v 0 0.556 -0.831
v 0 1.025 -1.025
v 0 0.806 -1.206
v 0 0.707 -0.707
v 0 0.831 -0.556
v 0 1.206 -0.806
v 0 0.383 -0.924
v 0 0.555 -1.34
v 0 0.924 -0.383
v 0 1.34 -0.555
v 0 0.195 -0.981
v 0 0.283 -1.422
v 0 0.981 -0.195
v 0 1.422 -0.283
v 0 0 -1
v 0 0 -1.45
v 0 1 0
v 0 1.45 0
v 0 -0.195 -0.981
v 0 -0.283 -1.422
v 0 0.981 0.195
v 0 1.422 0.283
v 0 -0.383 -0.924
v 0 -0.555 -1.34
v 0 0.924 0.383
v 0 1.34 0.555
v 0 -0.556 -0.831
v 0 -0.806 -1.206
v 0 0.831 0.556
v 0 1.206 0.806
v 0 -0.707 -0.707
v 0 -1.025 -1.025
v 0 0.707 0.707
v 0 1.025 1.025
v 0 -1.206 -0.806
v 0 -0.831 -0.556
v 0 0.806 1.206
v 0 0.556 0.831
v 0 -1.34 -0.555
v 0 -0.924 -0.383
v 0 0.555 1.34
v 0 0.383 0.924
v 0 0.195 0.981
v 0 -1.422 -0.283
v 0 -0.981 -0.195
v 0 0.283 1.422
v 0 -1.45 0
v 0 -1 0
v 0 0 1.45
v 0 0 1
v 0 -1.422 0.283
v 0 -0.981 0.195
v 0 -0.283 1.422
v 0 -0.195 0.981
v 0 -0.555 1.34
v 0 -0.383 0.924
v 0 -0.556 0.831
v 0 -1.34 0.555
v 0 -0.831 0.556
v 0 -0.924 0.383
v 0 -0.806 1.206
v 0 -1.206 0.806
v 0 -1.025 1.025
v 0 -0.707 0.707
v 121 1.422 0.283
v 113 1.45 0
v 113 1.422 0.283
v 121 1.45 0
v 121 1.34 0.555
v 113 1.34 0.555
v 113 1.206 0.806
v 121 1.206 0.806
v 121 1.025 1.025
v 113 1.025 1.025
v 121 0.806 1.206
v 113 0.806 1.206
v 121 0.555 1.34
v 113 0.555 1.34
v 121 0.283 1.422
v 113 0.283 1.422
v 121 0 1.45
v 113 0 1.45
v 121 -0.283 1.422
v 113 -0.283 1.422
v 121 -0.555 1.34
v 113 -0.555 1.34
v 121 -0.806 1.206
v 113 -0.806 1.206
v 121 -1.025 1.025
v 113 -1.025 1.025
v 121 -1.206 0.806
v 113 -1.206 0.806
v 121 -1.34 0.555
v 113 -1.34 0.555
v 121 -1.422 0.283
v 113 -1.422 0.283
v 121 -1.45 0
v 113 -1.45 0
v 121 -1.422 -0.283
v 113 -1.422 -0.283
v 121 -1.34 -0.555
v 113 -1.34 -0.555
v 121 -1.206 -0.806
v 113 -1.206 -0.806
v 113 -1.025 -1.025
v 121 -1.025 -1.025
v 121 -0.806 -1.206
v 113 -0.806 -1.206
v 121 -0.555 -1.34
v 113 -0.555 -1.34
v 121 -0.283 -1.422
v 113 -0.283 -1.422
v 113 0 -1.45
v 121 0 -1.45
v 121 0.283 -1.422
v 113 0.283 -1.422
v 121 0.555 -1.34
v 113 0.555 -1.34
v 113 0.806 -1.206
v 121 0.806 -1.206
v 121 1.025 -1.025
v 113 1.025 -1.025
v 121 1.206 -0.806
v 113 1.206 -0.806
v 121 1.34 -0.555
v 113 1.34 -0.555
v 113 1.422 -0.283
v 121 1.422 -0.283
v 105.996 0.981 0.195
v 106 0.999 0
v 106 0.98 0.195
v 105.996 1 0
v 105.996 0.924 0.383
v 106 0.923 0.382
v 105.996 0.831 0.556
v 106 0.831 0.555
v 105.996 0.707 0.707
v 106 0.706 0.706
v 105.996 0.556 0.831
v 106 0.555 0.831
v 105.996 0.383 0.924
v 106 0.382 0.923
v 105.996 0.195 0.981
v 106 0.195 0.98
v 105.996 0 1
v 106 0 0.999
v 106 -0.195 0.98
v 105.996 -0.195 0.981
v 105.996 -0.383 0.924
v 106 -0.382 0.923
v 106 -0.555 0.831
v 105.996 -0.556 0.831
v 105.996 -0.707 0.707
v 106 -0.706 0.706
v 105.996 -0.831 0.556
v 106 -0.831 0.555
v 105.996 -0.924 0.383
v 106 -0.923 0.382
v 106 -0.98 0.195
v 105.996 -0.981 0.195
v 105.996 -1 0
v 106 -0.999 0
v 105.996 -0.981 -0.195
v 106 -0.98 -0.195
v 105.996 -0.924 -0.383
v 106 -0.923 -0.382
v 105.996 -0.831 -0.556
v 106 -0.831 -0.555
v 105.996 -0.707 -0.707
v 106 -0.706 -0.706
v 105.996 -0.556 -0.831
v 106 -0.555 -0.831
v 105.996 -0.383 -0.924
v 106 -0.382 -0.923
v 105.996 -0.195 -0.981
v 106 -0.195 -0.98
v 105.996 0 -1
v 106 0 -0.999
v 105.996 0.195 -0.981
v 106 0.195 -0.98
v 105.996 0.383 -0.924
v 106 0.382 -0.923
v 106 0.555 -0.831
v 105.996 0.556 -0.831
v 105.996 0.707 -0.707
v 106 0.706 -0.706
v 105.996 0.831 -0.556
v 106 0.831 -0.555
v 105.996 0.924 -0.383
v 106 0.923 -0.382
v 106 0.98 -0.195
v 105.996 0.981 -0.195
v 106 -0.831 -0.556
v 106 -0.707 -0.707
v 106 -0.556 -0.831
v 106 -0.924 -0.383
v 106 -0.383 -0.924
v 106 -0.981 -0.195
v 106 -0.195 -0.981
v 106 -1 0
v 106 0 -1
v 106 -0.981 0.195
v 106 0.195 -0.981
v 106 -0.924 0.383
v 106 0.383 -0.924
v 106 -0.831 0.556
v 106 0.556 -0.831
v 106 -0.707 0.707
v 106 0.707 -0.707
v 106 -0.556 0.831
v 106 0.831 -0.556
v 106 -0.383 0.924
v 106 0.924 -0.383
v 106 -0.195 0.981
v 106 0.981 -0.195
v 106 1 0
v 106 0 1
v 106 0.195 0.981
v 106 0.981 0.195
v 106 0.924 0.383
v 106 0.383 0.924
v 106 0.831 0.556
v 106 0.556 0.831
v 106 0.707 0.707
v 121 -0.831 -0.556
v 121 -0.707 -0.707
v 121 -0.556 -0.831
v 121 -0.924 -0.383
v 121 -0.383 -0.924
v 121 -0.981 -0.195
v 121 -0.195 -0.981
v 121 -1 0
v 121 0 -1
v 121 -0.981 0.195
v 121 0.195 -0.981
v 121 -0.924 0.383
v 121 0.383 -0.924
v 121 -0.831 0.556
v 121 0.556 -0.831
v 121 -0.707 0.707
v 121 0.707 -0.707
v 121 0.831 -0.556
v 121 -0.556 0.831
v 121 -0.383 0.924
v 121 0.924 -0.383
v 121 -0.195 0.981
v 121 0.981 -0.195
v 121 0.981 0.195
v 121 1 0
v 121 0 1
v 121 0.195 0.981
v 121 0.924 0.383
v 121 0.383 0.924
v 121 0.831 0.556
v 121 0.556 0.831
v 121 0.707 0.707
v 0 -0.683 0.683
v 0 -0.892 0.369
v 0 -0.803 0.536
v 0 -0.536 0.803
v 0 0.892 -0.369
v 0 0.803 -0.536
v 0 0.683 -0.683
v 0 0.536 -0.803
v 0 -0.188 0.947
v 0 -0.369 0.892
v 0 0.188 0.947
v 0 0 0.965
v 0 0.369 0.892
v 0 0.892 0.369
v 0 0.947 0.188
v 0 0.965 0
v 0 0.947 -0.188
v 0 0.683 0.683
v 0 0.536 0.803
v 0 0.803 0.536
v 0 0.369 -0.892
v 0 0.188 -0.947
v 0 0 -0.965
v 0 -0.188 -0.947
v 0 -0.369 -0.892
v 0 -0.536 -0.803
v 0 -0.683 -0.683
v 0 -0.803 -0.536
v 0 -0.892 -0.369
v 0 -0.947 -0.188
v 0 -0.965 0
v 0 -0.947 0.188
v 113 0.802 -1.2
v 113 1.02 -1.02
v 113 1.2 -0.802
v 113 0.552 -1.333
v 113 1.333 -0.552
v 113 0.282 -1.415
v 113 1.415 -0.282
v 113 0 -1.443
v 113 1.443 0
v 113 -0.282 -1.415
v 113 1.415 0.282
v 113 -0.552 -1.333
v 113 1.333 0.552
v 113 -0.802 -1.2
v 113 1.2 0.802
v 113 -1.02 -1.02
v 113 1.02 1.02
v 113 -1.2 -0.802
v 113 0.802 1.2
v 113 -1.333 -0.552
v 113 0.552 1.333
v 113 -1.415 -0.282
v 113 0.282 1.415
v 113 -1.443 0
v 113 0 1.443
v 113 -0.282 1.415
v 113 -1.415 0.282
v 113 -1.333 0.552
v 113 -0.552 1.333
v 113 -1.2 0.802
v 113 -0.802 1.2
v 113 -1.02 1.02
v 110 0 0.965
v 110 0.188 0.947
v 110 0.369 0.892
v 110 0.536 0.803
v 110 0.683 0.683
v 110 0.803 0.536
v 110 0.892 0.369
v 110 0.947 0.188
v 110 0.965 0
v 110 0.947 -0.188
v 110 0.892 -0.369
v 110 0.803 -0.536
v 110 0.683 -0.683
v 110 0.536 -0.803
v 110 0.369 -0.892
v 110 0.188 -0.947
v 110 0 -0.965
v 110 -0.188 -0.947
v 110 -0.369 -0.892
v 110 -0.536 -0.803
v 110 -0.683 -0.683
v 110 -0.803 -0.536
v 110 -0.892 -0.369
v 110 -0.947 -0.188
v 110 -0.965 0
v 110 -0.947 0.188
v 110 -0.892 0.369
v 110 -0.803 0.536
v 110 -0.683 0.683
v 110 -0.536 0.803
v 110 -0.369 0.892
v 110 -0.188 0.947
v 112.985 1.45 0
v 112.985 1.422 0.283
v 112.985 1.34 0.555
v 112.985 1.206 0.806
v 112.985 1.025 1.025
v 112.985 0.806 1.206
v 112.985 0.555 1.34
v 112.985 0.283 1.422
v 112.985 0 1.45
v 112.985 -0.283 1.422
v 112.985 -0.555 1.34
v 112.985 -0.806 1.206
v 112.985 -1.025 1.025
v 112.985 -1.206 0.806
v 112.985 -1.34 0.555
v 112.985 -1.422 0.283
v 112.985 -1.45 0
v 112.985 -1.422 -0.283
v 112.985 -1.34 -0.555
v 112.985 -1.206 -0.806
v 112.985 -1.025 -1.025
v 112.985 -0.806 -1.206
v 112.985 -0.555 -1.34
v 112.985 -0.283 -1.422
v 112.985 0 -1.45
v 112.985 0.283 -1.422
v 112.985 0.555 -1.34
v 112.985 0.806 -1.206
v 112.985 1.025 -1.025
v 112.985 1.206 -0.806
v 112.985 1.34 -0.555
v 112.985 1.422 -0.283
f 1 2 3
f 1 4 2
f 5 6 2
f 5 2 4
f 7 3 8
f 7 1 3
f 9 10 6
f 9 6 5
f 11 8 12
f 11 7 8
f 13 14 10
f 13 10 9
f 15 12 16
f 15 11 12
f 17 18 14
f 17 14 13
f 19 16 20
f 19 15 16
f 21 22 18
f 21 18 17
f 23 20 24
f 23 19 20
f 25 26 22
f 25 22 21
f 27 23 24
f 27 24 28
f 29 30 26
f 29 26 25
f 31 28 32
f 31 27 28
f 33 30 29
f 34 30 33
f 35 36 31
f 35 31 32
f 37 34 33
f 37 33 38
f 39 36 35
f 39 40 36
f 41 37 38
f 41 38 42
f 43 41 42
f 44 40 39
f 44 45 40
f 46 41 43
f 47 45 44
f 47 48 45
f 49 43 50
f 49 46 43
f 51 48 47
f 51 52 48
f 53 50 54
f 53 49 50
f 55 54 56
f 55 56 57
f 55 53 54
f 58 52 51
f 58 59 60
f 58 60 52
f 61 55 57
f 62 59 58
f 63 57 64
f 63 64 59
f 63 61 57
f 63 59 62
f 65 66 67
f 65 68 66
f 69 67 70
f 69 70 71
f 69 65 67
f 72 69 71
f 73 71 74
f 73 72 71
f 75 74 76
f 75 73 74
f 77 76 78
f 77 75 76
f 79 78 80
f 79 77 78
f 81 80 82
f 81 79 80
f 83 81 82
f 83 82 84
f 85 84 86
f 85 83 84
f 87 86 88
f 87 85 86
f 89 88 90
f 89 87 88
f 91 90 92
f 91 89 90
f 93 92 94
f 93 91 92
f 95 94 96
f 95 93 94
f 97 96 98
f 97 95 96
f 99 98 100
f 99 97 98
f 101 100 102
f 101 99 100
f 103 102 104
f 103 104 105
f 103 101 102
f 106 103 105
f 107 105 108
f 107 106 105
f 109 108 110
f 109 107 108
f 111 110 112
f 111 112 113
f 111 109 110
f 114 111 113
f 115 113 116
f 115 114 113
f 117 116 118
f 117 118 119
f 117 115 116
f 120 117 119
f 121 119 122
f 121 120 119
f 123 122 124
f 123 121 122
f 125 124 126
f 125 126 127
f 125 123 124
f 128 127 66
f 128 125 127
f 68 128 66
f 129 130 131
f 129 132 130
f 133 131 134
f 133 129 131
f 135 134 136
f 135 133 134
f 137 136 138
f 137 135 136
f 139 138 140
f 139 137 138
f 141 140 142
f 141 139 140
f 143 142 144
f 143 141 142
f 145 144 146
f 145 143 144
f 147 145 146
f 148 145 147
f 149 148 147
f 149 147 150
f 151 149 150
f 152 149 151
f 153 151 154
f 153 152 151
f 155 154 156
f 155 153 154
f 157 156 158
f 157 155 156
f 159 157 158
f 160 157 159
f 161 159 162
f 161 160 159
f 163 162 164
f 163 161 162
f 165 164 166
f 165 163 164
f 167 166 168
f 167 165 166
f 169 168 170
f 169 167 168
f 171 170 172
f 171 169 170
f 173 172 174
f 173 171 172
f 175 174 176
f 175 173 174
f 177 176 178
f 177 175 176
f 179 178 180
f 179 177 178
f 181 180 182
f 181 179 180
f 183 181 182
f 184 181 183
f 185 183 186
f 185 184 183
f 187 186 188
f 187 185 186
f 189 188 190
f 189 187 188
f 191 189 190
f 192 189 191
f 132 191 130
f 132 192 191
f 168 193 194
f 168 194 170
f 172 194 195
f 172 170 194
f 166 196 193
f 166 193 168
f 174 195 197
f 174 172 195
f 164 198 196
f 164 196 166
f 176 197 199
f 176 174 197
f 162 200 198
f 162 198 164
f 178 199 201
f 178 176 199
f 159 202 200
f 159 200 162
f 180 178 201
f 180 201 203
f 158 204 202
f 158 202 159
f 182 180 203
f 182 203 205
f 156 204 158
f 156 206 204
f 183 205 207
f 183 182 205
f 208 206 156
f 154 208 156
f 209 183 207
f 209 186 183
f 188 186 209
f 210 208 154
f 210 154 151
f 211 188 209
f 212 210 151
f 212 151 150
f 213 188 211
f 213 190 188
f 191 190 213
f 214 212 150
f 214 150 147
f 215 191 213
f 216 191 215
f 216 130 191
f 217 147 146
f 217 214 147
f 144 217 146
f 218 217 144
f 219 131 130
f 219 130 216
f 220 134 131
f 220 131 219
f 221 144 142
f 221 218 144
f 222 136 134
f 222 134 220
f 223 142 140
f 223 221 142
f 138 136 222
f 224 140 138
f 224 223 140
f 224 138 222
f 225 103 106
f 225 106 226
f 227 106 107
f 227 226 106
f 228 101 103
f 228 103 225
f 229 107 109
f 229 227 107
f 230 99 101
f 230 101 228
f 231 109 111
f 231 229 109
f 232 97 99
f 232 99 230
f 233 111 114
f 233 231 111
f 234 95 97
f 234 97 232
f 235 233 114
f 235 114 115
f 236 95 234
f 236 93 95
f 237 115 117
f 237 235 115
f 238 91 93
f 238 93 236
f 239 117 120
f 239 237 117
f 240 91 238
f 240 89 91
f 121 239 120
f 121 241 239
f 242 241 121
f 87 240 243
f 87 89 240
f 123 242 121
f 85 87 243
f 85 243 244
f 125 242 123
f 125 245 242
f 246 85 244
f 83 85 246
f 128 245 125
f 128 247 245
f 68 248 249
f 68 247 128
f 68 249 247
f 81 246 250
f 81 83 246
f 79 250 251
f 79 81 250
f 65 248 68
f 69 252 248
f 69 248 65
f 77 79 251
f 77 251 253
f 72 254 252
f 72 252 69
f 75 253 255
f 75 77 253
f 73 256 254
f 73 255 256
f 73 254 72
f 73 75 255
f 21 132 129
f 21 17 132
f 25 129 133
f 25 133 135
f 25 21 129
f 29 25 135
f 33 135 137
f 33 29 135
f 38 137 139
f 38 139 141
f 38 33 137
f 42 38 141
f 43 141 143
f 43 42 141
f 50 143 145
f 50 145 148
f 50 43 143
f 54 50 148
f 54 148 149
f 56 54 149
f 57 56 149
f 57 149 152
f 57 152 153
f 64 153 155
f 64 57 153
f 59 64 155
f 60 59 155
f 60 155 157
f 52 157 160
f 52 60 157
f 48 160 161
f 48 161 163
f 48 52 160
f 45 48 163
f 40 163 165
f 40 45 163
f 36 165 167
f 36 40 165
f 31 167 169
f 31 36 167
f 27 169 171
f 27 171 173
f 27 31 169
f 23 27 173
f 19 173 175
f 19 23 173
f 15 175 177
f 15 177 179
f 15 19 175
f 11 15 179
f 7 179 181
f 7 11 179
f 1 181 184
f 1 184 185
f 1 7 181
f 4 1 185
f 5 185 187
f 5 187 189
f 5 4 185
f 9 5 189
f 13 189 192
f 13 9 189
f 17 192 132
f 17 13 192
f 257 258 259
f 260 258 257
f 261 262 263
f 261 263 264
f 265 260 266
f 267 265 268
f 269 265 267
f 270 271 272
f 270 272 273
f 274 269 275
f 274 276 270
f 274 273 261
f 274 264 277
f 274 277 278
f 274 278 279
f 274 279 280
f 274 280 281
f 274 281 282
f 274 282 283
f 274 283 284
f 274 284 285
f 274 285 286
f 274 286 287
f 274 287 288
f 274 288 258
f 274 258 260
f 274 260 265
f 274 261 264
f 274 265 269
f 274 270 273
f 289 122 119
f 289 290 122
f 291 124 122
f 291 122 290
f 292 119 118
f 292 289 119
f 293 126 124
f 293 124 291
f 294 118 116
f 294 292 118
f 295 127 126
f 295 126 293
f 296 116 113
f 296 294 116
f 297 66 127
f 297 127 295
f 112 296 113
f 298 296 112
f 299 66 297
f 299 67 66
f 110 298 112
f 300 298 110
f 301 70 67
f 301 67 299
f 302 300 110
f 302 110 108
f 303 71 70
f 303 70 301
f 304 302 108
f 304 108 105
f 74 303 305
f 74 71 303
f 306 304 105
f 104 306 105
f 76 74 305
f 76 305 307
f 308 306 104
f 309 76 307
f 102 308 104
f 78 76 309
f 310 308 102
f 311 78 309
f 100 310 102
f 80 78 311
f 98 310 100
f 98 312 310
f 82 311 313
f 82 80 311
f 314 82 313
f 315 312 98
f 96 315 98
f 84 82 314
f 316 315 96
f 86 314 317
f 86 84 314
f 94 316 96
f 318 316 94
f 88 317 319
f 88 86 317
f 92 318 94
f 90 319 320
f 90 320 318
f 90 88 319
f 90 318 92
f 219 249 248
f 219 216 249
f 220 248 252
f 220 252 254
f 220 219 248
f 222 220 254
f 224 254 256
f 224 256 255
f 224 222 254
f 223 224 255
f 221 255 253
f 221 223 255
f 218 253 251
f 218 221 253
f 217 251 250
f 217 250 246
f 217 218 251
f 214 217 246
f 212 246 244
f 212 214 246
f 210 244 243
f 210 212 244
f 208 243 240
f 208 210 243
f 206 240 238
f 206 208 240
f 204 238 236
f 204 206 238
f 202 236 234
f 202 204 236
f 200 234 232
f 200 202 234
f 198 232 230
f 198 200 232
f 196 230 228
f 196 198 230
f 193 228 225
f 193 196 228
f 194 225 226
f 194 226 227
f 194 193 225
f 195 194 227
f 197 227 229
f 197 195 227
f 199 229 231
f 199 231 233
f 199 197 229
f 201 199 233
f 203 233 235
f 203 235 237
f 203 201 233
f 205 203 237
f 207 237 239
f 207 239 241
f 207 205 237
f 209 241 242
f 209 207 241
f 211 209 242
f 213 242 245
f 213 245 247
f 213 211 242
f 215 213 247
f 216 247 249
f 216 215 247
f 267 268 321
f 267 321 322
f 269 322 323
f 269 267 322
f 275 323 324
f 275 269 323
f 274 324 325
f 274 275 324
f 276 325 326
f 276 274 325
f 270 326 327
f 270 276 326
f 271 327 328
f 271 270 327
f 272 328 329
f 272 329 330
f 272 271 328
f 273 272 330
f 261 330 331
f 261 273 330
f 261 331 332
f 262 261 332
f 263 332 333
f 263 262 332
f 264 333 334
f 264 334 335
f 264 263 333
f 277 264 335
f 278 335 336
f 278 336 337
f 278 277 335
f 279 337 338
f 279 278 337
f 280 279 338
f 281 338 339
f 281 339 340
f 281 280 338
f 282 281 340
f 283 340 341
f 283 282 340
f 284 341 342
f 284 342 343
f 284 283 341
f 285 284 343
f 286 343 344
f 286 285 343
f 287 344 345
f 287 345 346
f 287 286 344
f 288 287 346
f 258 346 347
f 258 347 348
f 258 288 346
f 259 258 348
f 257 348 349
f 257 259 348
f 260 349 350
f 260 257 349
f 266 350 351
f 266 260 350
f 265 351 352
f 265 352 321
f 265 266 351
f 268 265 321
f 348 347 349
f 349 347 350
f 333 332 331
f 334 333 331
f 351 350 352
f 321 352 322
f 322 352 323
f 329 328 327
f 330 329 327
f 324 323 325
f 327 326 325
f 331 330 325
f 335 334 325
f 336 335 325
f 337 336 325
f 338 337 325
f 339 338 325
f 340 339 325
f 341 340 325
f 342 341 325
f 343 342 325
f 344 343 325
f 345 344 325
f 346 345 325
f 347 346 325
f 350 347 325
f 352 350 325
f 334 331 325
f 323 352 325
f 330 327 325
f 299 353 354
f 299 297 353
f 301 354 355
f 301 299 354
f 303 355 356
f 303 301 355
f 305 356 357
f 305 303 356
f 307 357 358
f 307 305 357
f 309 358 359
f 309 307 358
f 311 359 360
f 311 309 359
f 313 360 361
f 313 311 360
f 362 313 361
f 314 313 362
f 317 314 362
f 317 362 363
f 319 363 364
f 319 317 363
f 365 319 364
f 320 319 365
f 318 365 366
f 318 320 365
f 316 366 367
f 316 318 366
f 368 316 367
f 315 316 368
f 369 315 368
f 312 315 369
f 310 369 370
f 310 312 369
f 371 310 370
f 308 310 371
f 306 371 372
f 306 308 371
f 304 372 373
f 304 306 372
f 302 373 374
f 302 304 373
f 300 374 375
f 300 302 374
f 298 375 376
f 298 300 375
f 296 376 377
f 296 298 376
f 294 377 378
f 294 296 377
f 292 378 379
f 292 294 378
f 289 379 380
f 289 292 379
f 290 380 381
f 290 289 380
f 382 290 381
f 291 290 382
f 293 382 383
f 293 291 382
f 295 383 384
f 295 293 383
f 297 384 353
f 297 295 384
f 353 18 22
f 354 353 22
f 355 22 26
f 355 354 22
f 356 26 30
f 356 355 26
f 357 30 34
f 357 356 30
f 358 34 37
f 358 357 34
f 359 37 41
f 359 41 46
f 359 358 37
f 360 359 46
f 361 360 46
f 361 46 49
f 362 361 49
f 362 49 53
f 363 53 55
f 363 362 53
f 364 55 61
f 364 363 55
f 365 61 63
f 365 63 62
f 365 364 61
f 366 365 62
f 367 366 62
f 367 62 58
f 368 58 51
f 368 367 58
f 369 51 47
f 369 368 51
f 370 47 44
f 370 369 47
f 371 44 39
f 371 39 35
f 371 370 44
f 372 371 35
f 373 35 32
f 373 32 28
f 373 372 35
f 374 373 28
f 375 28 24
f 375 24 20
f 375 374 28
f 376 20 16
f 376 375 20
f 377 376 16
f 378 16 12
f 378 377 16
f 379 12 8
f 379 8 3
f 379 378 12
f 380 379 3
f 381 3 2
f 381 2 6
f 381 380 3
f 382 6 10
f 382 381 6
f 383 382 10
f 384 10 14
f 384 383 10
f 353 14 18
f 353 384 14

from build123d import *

# Parameters (mm, degrees)
ESBO_O1_R                = 0.96528919
RESSALTO_EXTRUS_O1_DEPTH = 110


# Read off the part's stored shape, not the designer's step: Base-Revolve
with BuildPart() as part:
    # Base-Revolve outline → Base-Revolve (revolve)
    with BuildSketch(Plane.YX):
        Polygon((1.45, 121), (1, 121), (1, 106), (0.999, 106), (1, 105.996267949), (1, 0), (1.45, 0), (1.45, 112.985008226), (1.442960002, 113), (1.45, 113), align=None)
    revolve(axis=Axis((0, 0, 0), (1, 0, 0)))


with BuildPart() as body_2:
    # Esboço1 → Ressalto-extrusão1 (new body)
    with BuildSketch(Plane.ZY):
        Circle(ESBO_O1_R)
    extrude(amount=-RESSALTO_EXTRUS_O1_DEPTH)


solid = Compound([part.part, body_2.part])
